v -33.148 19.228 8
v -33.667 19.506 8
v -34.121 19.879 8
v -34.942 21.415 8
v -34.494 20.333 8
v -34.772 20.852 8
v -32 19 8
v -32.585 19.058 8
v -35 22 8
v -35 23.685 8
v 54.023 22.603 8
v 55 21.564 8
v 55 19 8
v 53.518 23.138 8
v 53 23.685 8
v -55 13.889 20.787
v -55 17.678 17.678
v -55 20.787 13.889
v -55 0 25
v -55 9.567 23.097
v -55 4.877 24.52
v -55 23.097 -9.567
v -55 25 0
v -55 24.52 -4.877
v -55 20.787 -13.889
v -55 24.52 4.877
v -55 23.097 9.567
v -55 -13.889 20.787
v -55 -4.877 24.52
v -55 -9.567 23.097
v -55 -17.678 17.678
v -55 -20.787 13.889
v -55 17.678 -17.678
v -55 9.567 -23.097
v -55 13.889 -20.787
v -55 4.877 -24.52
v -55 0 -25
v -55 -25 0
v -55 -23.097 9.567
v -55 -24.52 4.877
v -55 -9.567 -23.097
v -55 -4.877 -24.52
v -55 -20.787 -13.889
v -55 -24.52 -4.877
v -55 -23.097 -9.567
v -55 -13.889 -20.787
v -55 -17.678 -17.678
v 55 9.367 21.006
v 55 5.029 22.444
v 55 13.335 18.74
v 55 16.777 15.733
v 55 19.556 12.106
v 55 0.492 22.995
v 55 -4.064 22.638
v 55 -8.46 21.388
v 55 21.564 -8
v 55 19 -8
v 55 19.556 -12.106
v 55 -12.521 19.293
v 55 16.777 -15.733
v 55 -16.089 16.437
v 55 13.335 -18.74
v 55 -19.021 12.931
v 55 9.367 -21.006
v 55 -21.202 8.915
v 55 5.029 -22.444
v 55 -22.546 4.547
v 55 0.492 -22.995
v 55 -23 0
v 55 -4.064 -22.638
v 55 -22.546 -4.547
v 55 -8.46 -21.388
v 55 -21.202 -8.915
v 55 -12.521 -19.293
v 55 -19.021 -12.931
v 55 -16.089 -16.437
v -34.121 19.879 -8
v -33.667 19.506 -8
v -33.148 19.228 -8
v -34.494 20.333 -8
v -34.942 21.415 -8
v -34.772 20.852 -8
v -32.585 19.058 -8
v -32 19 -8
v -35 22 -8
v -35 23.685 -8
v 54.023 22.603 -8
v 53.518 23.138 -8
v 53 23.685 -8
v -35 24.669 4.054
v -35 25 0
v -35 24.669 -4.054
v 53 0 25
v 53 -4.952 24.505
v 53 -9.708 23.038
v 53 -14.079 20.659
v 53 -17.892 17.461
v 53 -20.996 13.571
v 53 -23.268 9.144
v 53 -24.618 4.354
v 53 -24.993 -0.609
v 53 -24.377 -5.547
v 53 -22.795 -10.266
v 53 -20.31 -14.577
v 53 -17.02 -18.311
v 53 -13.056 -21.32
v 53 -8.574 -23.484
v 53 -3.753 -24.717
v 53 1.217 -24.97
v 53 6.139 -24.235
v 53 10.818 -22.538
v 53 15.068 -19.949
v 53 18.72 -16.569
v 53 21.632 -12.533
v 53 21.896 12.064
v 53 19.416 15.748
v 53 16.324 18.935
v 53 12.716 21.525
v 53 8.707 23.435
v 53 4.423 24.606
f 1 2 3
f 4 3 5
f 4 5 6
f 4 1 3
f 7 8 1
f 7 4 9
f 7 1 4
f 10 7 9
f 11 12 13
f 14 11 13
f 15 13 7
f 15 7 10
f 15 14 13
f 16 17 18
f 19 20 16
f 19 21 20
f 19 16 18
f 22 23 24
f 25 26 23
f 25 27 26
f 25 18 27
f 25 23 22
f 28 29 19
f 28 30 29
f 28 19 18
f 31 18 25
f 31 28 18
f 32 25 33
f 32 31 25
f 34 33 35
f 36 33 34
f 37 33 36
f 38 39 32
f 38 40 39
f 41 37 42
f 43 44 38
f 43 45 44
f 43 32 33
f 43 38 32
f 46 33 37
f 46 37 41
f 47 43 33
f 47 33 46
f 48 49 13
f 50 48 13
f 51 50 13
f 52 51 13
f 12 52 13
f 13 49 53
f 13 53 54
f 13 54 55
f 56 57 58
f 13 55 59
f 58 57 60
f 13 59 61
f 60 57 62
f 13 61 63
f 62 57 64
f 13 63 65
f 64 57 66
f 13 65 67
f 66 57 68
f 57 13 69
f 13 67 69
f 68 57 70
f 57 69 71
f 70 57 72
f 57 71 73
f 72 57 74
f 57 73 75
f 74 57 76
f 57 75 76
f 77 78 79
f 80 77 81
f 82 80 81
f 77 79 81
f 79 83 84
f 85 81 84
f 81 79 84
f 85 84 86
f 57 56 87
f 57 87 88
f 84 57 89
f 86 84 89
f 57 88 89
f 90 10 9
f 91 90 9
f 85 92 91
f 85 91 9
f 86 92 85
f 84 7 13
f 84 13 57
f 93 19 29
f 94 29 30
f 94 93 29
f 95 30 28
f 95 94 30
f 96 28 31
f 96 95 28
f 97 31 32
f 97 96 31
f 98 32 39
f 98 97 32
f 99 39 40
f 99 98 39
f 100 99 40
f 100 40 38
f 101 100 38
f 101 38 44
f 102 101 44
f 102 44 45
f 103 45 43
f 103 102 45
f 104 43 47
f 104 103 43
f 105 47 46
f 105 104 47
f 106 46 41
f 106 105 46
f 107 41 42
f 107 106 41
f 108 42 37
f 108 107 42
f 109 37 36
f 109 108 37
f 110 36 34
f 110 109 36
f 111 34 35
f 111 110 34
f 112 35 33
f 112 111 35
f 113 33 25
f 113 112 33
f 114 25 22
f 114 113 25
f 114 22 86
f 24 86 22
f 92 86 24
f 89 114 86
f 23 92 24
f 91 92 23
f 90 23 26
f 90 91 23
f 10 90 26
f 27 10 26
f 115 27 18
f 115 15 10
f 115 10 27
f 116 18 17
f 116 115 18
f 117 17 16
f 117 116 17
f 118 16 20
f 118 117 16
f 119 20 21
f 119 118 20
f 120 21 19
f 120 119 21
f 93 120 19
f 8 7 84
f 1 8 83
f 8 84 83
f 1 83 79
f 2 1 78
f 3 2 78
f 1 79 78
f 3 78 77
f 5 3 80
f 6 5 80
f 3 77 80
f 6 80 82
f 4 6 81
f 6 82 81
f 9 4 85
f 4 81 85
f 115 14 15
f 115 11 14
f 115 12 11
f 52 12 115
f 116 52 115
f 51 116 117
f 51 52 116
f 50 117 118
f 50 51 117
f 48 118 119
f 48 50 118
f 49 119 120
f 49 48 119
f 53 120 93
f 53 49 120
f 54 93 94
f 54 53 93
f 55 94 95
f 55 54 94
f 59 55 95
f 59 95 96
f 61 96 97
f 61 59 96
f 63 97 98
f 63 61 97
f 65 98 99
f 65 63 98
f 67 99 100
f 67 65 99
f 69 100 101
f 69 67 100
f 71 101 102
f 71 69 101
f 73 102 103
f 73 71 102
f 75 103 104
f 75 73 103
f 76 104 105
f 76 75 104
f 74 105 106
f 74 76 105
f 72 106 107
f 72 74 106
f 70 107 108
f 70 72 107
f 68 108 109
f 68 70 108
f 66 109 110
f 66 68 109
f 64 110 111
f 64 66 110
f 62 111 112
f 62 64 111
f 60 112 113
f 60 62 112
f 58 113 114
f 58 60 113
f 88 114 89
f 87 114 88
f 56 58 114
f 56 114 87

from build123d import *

# Parameters (mm, degrees)
SKETCH1_W          = 110
SKETCH1_H          = 25
SKETCH2_W          = 16
SKETCH2_H          = 11.86901723
CUT_EXTRUDE1_DEPTH = 90
CHAMFER1_SIZE      = 2
FILLET1_R          = 3


with BuildPart() as part:
    # Sketch1 → Revolve1 (revolve)
    with BuildSketch(Plane.XY, mode=Mode.PRIVATE) as revolve1_sk:
        with Locations((0, 12.5)):
            Rectangle(SKETCH1_W, SKETCH1_H)
    revolve(revolve1_sk.sketch.rotate(Axis((-55, 0, 0), (1, 0, 0)), 90), axis=Axis((-55, 0, 0), (1, 0, 0)))

    # Sketch2 → Cut-Extrude1 (cut)
    with BuildSketch(Plane(origin=(55, 0, 0), x_dir=(0, 0, -1), z_dir=(1, 0, 0))):
        with Locations((0, 24.934508615)):
            Rectangle(SKETCH2_W, SKETCH2_H)
    extrude(amount=-CUT_EXTRUDE1_DEPTH, mode=Mode.SUBTRACT)

    # Chamfer1
    chamfer1_edges = [part.edges().sort_by_distance(p)[0] for p in [
        (55, -20.310096012, -14.577379737),
    ]]
    chamfer(chamfer1_edges, length=CHAMFER1_SIZE)

    # Fillet1
    fillet1_edges = [part.edges().sort_by_distance(p)[0] for p in [
        (-35, 19, 0),
    ]]
    fillet(fillet1_edges, radius=FILLET1_R)


solid = part.part
